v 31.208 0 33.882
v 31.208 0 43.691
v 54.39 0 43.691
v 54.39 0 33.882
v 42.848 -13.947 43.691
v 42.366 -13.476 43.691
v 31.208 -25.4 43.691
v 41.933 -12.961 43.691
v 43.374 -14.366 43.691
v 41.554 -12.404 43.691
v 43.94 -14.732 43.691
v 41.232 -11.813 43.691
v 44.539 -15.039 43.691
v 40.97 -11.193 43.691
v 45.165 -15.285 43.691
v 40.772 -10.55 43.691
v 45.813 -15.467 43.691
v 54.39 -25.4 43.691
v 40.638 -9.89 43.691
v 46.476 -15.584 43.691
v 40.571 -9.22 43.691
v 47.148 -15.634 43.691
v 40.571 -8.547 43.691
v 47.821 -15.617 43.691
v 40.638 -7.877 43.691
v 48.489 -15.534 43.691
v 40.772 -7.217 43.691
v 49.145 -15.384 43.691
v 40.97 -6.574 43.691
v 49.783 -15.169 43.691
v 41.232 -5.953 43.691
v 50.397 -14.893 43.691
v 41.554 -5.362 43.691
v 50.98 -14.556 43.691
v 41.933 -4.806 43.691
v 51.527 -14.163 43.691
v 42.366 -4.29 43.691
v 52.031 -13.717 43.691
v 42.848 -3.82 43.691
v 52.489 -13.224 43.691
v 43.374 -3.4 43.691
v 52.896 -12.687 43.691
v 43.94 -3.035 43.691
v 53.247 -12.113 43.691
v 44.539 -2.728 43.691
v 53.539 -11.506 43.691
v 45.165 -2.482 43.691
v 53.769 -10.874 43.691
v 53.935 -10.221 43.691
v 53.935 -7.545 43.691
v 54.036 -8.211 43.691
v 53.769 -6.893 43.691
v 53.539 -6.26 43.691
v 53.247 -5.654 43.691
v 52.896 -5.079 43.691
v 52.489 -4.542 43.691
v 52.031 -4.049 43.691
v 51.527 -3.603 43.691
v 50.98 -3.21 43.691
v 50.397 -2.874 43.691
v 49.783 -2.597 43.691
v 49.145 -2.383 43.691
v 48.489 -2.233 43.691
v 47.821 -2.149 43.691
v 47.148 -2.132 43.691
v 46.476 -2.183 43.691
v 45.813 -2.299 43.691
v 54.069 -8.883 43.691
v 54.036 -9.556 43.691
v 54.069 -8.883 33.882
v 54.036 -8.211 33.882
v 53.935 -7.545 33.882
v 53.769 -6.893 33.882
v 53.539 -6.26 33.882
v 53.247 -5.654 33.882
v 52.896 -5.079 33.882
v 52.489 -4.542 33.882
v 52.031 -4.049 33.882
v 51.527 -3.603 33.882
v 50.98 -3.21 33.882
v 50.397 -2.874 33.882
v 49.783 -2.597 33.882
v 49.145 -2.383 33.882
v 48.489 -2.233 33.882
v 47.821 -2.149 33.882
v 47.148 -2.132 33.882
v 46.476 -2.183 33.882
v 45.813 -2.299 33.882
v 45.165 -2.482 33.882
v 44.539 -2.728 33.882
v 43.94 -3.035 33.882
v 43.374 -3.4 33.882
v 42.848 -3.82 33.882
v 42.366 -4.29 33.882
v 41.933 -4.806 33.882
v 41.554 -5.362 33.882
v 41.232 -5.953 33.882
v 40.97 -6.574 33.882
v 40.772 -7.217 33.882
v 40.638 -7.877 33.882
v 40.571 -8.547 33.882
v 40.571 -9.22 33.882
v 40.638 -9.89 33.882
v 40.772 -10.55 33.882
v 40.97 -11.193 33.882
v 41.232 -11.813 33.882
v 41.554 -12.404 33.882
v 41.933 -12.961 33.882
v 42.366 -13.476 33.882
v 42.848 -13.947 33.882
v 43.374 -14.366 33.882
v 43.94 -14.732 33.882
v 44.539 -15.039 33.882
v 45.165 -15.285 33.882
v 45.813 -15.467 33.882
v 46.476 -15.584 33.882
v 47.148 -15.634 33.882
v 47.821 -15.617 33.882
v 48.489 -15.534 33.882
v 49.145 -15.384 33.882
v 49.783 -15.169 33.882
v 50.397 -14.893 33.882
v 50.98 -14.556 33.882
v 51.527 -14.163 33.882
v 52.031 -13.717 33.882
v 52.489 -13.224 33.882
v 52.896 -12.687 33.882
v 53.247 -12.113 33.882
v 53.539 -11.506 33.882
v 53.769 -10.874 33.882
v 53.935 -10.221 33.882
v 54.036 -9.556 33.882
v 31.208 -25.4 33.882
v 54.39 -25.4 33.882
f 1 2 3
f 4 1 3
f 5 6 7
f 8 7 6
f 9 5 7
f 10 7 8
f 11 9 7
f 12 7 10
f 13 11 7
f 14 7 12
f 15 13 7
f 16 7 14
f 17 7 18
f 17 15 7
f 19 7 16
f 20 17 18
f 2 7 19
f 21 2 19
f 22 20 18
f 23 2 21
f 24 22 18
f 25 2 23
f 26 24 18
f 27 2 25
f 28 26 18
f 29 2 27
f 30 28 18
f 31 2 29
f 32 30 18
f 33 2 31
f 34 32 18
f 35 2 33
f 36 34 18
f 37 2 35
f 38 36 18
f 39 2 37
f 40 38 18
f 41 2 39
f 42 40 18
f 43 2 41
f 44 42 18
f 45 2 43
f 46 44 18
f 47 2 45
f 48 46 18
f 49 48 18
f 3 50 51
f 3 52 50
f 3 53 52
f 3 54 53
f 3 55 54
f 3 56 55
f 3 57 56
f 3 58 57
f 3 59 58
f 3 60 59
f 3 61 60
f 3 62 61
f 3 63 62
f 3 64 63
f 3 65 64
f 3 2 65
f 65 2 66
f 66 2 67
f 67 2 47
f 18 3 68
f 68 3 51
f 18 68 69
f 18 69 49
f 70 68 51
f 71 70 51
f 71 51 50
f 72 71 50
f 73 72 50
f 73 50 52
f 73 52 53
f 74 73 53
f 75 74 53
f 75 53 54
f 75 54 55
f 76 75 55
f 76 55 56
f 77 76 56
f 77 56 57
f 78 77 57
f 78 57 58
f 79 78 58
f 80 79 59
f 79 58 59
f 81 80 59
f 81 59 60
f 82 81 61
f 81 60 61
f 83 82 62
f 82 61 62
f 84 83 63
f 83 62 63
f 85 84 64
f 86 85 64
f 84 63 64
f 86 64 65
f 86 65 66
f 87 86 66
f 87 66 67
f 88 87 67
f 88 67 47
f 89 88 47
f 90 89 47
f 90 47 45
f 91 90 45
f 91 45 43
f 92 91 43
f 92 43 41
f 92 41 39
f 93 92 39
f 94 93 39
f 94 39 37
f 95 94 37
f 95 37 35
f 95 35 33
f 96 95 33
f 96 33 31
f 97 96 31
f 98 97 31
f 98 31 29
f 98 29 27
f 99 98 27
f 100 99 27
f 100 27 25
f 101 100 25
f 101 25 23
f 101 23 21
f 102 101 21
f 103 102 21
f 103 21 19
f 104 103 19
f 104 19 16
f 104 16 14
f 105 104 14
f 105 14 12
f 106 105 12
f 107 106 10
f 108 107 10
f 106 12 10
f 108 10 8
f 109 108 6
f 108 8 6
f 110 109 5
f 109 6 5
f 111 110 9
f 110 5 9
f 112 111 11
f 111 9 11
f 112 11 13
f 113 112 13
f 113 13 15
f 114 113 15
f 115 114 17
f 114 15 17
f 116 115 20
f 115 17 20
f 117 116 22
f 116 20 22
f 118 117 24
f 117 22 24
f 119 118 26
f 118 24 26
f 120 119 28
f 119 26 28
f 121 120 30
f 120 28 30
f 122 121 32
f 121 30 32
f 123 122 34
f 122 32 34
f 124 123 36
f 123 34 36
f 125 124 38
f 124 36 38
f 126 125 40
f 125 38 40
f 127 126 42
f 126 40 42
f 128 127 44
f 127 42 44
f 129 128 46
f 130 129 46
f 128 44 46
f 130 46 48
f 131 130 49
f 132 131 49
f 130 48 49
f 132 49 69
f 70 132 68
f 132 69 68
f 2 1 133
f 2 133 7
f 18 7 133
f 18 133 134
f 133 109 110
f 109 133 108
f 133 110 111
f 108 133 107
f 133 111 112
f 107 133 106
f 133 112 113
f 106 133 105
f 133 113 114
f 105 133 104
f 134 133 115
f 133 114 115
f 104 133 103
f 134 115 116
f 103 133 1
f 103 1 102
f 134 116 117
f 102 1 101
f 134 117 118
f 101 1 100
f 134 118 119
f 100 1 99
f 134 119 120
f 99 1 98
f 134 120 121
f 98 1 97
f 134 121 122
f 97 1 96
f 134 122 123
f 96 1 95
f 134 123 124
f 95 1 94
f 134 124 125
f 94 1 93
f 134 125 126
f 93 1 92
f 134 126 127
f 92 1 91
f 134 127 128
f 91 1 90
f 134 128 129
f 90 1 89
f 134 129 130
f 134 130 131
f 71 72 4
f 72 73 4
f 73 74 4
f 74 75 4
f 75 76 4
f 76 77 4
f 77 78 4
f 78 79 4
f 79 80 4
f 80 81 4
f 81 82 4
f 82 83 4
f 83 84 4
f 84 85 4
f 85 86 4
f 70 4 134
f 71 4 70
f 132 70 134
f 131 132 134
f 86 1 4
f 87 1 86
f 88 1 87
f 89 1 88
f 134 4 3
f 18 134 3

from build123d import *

# Parameters (mm, degrees)
F0_W     = 23.182752
F0_H     = 9.80809
F1_DEPTH = 25.4
F3_DEPTH = 25.4
F4_R     = 6.753053
F5_DEPTH = 25.4


with BuildPart() as f1:
    # F0 (on Front) → F1 (new body)
    with BuildSketch(Plane.XZ):
        with Locations((42.798924, 38.786521)):
            Rectangle(F0_W, F0_H)
    extrude(amount=F1_DEPTH)

    # F2 (on face) → F3 (cut)
    with BuildSketch(Plane.XY.offset(43.690566)):
        with BuildLine():
            ThreePointArc((31.207548, -16.712405), (36.557414, -22.06227), (41.907279, -16.712405))
            ThreePointArc((41.907279, -16.712405), (36.557414, -11.36254), (31.207548, -16.712405))
        make_face()
    extrude(amount=F3_DEPTH, mode=Mode.SUBTRACT)

    # F4 (on face) → F5 (cut)
    with BuildSketch(Plane.XY.offset(43.690566)):
        with Locations((47.316056, -8.88319)):
            Circle(F4_R)
    extrude(amount=-F5_DEPTH, mode=Mode.SUBTRACT)


solid = f1.part
